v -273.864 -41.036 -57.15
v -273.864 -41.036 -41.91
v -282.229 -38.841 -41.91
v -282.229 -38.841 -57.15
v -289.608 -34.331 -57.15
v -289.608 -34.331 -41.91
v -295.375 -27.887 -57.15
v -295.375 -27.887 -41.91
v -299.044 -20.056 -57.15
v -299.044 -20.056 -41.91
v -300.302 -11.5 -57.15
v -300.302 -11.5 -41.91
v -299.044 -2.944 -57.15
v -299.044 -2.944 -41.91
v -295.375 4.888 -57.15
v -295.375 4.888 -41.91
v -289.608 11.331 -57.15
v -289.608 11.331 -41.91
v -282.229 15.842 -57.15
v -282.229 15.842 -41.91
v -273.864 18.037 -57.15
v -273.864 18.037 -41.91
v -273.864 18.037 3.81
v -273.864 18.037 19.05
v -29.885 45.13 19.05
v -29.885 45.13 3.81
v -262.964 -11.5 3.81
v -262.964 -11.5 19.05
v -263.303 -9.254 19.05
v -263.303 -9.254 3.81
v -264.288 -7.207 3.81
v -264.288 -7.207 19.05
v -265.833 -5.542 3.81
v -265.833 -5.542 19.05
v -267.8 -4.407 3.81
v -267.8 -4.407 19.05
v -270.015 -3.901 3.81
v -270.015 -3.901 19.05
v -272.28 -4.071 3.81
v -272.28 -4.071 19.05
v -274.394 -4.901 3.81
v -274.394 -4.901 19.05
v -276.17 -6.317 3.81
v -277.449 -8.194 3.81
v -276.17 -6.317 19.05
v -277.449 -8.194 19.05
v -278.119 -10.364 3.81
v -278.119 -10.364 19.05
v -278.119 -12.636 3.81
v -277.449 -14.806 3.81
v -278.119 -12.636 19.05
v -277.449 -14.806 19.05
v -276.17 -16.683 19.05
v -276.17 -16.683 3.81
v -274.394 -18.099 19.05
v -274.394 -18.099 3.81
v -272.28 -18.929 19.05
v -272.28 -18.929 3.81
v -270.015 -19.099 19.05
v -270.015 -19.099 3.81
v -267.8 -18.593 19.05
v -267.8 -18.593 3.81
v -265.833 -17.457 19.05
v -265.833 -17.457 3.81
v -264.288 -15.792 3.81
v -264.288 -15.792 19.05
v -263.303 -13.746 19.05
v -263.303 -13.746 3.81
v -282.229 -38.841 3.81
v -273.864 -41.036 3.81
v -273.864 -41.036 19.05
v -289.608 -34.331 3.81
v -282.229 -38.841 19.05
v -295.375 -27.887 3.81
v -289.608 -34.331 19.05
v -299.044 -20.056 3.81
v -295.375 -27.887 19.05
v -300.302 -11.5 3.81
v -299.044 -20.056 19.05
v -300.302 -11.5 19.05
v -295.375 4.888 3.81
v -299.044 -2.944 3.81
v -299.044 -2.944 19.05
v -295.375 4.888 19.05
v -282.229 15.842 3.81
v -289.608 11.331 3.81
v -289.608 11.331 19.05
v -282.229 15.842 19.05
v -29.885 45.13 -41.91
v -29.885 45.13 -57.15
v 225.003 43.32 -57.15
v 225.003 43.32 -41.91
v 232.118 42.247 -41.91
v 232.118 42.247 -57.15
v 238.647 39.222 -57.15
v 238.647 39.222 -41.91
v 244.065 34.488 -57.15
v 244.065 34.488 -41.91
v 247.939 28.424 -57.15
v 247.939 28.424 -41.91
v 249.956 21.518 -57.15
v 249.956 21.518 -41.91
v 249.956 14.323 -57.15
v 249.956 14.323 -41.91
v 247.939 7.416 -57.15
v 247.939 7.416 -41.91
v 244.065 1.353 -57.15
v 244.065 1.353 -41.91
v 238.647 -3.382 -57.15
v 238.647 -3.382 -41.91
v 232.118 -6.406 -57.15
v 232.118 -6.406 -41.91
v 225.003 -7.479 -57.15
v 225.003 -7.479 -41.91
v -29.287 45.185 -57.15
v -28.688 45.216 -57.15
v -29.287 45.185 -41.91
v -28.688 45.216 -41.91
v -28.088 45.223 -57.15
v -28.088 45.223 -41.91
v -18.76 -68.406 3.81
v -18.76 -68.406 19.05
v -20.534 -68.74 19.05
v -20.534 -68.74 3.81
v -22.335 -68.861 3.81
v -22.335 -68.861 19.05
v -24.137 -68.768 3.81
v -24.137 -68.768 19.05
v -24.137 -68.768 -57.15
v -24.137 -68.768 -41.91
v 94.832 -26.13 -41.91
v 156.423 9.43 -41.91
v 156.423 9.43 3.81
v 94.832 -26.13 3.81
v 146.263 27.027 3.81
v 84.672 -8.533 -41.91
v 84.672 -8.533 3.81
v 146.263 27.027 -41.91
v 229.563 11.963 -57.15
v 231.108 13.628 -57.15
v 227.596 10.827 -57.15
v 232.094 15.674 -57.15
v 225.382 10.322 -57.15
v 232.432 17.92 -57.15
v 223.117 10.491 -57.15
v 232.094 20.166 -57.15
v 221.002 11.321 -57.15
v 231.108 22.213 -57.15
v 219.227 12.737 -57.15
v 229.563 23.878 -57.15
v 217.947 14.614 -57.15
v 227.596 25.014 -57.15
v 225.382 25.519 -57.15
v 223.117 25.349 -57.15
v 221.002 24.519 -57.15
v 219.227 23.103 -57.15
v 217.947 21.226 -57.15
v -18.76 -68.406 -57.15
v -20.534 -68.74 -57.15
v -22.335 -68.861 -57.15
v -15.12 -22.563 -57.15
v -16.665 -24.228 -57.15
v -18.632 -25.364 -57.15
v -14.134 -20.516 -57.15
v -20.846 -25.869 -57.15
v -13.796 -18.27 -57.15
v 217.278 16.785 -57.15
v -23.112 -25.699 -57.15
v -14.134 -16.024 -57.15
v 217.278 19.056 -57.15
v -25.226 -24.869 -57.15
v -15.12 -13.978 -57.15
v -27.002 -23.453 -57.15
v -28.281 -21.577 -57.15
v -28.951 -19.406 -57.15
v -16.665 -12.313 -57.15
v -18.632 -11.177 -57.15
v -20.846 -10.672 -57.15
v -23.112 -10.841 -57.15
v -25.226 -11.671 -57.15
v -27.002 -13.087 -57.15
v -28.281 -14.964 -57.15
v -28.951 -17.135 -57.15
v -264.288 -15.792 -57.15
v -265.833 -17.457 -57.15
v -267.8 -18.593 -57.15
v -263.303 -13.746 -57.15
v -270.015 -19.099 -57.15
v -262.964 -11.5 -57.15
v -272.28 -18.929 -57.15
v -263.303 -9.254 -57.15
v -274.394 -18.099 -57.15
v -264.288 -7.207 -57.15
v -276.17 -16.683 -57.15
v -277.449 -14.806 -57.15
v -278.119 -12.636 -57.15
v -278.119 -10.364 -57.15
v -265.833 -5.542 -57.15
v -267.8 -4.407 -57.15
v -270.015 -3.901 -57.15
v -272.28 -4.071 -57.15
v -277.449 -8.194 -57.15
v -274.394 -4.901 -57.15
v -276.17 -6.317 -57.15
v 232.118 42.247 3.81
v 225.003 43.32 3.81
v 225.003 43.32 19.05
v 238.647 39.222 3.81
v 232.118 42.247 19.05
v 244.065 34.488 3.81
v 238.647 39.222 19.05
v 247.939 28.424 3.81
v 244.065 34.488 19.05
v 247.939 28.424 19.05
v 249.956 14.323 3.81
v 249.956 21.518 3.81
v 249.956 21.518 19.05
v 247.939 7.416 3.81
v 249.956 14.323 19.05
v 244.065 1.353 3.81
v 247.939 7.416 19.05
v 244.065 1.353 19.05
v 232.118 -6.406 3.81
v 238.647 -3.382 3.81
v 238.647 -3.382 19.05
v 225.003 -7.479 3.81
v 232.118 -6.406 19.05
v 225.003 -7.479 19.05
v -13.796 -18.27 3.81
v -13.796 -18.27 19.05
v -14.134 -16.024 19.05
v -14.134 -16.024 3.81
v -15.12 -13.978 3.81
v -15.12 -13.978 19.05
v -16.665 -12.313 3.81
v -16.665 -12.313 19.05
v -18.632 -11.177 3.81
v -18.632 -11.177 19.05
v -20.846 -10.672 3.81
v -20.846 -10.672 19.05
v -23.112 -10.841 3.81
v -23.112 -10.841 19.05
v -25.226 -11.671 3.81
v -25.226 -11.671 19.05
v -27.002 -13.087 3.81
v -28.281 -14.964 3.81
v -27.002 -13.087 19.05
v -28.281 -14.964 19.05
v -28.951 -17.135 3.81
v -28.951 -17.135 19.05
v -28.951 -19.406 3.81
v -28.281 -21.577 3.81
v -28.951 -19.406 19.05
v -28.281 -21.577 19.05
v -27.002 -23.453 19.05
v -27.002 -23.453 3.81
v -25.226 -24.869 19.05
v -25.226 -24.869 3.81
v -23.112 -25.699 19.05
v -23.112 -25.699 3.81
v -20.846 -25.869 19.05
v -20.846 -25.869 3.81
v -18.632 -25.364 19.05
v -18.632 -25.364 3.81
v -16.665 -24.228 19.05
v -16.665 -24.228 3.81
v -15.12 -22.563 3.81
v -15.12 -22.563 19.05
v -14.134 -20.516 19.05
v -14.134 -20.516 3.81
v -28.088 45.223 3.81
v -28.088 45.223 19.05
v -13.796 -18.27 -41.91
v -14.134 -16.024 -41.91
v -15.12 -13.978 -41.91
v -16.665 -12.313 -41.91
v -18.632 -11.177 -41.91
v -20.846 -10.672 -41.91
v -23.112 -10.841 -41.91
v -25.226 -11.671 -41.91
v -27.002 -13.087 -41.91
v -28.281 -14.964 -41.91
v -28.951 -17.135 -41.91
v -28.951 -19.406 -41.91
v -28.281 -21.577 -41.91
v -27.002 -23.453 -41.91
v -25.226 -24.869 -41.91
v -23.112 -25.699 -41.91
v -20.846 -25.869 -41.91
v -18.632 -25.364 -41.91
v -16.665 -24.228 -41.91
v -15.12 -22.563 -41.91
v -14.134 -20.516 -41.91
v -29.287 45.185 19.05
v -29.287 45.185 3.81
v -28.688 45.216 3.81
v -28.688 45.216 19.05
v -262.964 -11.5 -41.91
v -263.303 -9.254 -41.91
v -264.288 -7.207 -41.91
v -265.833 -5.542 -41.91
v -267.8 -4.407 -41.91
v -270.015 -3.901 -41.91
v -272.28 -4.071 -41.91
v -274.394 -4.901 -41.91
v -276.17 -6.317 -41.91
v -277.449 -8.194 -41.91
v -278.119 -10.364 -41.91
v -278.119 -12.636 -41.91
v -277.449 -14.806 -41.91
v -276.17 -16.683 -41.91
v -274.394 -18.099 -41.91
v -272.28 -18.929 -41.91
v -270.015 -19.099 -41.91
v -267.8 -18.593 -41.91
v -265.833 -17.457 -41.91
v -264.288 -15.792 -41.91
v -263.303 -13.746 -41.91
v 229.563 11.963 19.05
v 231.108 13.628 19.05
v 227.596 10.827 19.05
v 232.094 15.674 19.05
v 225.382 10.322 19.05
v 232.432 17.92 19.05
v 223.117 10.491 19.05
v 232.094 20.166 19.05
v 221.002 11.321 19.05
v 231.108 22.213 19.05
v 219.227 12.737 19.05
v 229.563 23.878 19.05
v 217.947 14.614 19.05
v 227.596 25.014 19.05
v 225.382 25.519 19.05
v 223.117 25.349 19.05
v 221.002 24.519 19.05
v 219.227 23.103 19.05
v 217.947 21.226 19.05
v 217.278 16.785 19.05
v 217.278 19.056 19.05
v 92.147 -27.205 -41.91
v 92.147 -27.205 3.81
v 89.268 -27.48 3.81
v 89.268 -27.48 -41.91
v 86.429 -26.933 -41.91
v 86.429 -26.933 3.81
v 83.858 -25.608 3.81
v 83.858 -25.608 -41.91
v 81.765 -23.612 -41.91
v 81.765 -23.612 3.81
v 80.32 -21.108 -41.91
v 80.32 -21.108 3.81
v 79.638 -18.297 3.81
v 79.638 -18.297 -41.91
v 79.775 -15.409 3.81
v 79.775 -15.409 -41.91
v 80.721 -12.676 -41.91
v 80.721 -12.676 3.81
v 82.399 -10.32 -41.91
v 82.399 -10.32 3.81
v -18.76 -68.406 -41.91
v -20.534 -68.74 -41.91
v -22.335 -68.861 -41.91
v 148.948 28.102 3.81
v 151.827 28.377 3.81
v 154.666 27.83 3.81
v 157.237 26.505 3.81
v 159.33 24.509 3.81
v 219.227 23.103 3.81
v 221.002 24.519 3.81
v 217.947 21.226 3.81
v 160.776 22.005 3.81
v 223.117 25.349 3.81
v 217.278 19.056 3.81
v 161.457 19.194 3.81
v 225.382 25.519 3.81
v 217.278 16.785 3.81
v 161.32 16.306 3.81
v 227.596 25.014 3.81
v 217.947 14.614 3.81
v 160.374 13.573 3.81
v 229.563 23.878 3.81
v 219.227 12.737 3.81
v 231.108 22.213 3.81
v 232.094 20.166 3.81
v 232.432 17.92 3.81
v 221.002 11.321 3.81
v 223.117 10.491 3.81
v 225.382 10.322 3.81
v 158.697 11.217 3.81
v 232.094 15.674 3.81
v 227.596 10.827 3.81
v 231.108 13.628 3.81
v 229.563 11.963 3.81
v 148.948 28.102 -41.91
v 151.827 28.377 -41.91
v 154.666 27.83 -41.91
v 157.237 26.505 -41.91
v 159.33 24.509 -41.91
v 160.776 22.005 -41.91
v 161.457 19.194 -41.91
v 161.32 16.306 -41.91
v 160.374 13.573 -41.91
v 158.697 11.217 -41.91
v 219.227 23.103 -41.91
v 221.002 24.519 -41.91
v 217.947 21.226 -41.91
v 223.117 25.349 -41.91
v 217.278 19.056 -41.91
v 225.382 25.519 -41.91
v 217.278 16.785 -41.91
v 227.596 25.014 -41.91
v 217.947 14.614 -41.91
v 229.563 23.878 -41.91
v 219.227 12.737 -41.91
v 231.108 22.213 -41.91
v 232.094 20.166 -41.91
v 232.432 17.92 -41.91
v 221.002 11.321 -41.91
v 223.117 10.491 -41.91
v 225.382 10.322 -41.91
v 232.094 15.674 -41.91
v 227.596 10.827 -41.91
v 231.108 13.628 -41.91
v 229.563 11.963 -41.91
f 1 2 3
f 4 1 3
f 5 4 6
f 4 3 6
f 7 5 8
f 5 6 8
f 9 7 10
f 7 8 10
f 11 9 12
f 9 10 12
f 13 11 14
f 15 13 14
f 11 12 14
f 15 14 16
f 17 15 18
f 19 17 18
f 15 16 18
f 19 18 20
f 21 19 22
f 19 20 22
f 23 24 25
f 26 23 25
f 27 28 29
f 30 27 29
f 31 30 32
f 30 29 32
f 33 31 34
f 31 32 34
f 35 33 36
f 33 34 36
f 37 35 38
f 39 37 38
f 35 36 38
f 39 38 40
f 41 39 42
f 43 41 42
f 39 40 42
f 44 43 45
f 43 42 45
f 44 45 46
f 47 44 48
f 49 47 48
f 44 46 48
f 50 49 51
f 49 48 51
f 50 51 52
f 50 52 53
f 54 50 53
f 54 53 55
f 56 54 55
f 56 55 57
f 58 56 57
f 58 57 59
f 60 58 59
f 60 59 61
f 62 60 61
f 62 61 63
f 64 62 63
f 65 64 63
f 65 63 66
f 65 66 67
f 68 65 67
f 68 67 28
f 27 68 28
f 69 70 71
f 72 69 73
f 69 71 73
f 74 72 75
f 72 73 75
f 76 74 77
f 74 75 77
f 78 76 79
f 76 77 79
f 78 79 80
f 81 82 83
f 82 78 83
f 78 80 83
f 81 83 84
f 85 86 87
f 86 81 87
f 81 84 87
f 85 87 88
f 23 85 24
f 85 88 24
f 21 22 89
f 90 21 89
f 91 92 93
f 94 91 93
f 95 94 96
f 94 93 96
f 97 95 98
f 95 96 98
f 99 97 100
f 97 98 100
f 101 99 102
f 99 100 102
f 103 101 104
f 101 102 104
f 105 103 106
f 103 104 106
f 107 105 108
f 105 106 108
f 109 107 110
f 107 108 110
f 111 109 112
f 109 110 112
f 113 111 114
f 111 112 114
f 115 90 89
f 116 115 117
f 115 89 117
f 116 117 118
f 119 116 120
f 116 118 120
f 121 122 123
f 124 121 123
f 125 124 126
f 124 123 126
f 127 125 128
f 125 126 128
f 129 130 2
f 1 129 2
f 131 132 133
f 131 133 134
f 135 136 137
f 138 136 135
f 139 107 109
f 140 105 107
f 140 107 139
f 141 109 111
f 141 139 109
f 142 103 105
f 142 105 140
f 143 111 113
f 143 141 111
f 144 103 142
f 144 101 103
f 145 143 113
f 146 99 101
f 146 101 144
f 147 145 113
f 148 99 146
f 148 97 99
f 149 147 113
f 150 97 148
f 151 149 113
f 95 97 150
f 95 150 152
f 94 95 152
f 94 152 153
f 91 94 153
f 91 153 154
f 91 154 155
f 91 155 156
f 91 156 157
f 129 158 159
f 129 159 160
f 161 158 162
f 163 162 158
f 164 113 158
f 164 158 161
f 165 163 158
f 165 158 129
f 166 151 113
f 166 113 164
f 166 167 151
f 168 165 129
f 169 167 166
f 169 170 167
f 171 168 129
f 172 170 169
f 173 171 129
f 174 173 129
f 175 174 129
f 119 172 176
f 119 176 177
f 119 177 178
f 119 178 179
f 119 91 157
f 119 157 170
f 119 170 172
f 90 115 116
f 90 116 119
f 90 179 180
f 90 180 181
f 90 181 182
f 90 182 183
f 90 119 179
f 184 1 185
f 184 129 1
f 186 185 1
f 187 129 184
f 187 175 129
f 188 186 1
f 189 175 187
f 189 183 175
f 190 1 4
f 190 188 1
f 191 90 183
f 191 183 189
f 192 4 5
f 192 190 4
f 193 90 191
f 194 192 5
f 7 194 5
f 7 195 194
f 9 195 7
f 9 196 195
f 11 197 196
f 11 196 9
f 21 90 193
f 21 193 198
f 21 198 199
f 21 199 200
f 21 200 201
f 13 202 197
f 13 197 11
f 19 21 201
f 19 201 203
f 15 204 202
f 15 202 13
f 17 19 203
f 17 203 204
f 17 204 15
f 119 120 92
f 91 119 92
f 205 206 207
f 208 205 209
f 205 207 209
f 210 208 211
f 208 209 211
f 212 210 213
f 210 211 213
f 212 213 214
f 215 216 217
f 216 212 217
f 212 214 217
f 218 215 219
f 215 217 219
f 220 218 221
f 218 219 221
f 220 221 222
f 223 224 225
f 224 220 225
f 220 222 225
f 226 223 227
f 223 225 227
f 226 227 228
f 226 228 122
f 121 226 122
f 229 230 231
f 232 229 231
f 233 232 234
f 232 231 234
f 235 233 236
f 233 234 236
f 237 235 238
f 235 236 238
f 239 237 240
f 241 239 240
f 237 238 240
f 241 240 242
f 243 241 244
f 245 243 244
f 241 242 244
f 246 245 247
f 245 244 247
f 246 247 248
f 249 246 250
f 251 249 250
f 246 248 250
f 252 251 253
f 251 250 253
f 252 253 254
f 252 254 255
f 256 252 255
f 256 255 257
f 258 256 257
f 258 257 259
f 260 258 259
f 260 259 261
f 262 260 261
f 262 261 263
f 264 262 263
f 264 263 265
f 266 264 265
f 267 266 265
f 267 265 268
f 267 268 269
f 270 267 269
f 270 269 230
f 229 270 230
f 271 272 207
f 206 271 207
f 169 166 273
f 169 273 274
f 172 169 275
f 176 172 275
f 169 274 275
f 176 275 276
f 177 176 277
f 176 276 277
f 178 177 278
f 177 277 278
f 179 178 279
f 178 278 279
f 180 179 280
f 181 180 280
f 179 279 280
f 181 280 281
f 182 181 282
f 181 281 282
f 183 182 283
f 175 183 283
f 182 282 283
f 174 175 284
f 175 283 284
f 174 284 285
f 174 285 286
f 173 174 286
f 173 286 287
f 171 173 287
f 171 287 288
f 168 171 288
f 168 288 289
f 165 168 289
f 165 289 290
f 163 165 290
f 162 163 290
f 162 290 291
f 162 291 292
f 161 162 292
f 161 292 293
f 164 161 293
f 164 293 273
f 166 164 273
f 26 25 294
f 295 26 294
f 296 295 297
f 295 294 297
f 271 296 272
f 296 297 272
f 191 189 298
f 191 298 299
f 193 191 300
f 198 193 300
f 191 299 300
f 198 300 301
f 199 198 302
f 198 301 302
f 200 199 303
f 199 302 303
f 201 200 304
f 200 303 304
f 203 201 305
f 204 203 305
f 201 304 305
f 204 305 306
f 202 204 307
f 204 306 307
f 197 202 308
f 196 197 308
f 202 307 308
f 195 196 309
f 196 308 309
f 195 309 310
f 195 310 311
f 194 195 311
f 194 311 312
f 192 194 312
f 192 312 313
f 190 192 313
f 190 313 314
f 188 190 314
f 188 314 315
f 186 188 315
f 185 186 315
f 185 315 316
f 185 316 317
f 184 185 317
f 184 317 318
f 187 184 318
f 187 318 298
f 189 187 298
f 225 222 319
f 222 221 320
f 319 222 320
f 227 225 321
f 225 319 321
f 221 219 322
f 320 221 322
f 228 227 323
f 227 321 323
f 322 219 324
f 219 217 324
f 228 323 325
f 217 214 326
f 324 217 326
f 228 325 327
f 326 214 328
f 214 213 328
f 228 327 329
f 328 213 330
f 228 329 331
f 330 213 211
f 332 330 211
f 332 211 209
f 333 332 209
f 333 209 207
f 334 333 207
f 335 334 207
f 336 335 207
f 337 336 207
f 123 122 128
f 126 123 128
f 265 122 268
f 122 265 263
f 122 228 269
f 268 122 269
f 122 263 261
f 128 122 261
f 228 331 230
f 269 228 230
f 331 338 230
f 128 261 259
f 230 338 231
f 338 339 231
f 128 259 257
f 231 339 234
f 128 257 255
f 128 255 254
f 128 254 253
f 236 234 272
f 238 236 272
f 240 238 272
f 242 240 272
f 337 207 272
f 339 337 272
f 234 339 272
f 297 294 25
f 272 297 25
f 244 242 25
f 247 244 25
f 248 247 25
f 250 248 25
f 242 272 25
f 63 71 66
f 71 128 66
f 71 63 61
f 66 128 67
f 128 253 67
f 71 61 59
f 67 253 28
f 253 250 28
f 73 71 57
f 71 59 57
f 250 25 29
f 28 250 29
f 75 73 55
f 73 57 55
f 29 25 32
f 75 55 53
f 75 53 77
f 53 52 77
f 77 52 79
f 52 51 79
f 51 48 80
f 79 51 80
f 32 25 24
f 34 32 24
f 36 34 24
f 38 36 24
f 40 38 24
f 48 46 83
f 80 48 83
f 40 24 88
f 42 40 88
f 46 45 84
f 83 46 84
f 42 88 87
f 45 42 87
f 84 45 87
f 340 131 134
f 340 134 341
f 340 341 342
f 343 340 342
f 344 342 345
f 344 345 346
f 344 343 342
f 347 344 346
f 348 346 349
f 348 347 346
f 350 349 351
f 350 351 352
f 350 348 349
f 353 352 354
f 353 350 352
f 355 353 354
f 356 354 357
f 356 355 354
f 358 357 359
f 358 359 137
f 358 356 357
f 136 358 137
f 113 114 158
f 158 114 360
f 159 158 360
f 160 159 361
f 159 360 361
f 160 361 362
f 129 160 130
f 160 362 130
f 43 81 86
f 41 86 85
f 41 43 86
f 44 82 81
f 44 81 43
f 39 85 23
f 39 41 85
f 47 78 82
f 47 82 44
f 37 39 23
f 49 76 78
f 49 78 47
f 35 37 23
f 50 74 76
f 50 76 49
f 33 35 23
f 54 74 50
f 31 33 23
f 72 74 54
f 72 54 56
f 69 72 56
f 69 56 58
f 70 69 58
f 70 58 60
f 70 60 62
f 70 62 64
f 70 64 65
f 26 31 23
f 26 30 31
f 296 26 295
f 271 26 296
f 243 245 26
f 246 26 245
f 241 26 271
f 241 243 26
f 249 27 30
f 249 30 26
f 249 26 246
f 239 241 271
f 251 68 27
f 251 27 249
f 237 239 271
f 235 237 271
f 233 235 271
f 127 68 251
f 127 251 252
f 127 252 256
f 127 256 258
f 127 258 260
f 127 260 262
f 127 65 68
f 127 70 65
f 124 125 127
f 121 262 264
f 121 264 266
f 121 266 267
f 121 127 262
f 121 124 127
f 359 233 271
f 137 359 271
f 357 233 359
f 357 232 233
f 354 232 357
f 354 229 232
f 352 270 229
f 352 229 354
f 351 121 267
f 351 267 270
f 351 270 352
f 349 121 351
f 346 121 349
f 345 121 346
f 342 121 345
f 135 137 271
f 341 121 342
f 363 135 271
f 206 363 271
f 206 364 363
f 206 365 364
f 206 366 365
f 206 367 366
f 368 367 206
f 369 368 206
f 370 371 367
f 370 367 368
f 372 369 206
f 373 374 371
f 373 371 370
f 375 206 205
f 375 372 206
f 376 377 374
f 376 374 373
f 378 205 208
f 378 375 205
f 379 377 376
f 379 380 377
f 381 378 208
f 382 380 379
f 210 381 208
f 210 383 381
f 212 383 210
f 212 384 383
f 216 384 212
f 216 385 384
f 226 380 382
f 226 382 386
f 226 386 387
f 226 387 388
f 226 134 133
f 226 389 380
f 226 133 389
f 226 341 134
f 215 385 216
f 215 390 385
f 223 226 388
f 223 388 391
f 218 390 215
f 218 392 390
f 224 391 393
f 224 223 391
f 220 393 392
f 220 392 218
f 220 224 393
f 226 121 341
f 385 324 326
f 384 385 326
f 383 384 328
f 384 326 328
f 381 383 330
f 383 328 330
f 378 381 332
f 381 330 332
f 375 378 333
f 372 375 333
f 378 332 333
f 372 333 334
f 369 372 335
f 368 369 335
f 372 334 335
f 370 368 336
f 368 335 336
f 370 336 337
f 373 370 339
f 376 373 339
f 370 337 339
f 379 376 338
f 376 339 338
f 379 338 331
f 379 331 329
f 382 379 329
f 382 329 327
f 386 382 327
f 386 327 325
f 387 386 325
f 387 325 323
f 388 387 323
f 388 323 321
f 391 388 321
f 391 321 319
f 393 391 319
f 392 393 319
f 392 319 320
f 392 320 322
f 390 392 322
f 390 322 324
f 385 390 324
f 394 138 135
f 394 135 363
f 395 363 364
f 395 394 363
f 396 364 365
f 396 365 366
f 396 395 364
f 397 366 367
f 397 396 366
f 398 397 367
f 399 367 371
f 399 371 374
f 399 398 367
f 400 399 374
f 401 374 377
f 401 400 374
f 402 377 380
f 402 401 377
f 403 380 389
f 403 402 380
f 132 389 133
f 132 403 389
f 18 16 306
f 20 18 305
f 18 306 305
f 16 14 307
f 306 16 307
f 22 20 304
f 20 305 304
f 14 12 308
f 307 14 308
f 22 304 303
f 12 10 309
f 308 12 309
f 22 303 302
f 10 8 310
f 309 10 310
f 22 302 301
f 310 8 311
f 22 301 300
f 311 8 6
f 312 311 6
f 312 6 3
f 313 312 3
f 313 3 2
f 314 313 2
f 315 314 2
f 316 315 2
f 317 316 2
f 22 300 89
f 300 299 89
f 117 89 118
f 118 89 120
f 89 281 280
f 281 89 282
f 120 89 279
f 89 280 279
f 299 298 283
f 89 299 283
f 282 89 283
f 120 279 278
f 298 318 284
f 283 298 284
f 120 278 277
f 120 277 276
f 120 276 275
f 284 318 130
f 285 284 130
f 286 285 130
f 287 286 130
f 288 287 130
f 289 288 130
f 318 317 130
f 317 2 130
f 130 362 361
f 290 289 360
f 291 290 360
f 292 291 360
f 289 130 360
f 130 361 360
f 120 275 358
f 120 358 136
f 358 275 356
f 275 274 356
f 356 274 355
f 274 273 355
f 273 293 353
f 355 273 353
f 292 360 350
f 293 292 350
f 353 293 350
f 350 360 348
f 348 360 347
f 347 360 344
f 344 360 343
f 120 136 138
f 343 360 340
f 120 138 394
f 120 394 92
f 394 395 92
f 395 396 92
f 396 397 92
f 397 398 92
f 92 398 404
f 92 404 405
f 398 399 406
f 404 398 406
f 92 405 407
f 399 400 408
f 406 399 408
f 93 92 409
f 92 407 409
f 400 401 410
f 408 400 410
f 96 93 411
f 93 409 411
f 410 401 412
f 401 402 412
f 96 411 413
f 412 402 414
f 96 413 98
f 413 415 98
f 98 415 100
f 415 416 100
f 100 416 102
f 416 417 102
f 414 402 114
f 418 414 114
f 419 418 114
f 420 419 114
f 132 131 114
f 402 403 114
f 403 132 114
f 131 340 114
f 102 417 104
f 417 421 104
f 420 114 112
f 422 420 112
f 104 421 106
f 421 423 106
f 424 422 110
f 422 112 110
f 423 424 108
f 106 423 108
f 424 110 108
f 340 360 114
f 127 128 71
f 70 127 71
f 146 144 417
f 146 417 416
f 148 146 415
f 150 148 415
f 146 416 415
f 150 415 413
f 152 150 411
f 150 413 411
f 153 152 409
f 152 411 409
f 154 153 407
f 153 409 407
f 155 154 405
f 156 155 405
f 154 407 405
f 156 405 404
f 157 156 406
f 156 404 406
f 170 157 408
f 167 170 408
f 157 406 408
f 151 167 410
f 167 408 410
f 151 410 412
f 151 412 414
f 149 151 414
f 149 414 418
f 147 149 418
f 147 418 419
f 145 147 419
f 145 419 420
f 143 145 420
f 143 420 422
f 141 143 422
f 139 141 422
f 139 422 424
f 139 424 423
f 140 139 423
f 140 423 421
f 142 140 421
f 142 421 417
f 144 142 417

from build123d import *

# Parameters (mm, degrees)
SKETCH1_R               = 3.81
BOSS_EXTRUDE1_DEPTH     = 38.1
CUT_EXTRUDE1_DEPTH      = 170.081733479
CUT_EXTRUDE1_DEPTH_BACK = 170.081733479
SKETCH2_W               = 296.702154824
SKETCH2_H               = 22.86
BOSS_EXTRUDE2_DEPTH     = 22.86
SCALE1_SCALE            = 2


with BuildPart() as part:
    # Sketch1 → Boss-Extrude1 (new body)
    with BuildSketch(Plane.XY):
        with BuildLine():
            Line((-147.344668758, 6.620564835), (-25.355087155, 20.167363089))
            ThreePointArc((-25.355087155, 20.167363089), (-24.906608979, 20.2037996), (-24.456762072, 20.213701798))
            Line((-24.456762072, 20.213701798), (102.089114394, 19.262041389))
            ThreePointArc((102.089114394, 19.262041389), (114.69360954, 6.562400496), (102.089114394, -6.137240398))
            Line((102.089114394, -6.137240398), (-19.792437318, -36.600949276))
            ThreePointArc((-19.792437318, -36.600949276), (-21.128759573, -36.811186783), (-22.481199669, -36.781813943))
            Line((-22.481199669, -36.781813943), (-147.344668758, -22.915873894))
            ThreePointArc((-147.344668758, -22.915873894), (-160.563675525, -8.14765453), (-147.344668758, 6.620564835))
        make_face()
        with Locations((-145.704675525, -8.14765453)):
            Circle(SKETCH1_R, mode=Mode.SUBTRACT)
        with Locations((101.99360954, 6.562400496)):
            Circle(SKETCH1_R, mode=Mode.SUBTRACT)
        with Locations((-21.120571626, -11.532910072)):
            Circle(SKETCH1_R, mode=Mode.SUBTRACT)
    extrude(amount=-BOSS_EXTRUDE1_DEPTH)

    # Sketch2 → Cut-Extrude1 (cut, two sides: drawn at the far end of the back side and taken through both)
    with BuildSketch(Plane(origin=(0, 0, 0), x_dir=(1, 0, 0), z_dir=(0, 1, 0)).offset(-CUT_EXTRUDE1_DEPTH_BACK)):
        with Locations((-25.145403948, 19.05)):
            Rectangle(SKETCH2_W, SKETCH2_H)
    extrude(amount=CUT_EXTRUDE1_DEPTH + CUT_EXTRUDE1_DEPTH_BACK, mode=Mode.SUBTRACT)


with BuildPart() as cut_extrude1_piece_1:
    # of the separate pieces the step leaves, piece 1, a body of its own (cut_extrude1_pieces)
    add(part.part.solids().sort_by_distance((-25.355087155, 20.167363089, -30.48))[0])



with BuildPart() as cut_extrude1_piece_2:
    # of the separate pieces the step leaves, piece 2, a body of its own (cut_extrude1_pieces)
    add(part.part.solids().sort_by_distance((-147.344668758, 6.620564835, 0))[0])


with BuildPart() as cut_extrude1_piece_1_1:
    add(cut_extrude1_piece_1.part)

    add(cut_extrude1_piece_2.part)  # Boss-Extrude2 merges Cut-Extrude1 piece 2
    # Sketch6 → Boss-Extrude2 (add)
    with BuildSketch(Plane.XY.offset(-30.48)):
        with BuildLine():
            Line((67.799114394, 2.317128757), (37.003251036, -15.462871243))
            ThreePointArc((37.003251036, -15.462871243), (30.063841985, -13.603462192), (31.923251036, -6.664053141))
            Line((31.923251036, -6.664053141), (62.719114394, 11.115946859))
            ThreePointArc((62.719114394, 11.115946859), (69.658523446, 9.256537808), (67.799114394, 2.317128757))
        make_face()
    extrude(amount=BOSS_EXTRUDE2_DEPTH)


with BuildPart() as cut_extrude1_piece_1_2:
    # Scale1: scaled about (-20.825252389, -4.795459228, -19.05)
    add(cut_extrude1_piece_1_1.part.scale(SCALE1_SCALE).moved(Location((20.825252389, 4.795459228, 19.05))))


solid = cut_extrude1_piece_1_2.part
